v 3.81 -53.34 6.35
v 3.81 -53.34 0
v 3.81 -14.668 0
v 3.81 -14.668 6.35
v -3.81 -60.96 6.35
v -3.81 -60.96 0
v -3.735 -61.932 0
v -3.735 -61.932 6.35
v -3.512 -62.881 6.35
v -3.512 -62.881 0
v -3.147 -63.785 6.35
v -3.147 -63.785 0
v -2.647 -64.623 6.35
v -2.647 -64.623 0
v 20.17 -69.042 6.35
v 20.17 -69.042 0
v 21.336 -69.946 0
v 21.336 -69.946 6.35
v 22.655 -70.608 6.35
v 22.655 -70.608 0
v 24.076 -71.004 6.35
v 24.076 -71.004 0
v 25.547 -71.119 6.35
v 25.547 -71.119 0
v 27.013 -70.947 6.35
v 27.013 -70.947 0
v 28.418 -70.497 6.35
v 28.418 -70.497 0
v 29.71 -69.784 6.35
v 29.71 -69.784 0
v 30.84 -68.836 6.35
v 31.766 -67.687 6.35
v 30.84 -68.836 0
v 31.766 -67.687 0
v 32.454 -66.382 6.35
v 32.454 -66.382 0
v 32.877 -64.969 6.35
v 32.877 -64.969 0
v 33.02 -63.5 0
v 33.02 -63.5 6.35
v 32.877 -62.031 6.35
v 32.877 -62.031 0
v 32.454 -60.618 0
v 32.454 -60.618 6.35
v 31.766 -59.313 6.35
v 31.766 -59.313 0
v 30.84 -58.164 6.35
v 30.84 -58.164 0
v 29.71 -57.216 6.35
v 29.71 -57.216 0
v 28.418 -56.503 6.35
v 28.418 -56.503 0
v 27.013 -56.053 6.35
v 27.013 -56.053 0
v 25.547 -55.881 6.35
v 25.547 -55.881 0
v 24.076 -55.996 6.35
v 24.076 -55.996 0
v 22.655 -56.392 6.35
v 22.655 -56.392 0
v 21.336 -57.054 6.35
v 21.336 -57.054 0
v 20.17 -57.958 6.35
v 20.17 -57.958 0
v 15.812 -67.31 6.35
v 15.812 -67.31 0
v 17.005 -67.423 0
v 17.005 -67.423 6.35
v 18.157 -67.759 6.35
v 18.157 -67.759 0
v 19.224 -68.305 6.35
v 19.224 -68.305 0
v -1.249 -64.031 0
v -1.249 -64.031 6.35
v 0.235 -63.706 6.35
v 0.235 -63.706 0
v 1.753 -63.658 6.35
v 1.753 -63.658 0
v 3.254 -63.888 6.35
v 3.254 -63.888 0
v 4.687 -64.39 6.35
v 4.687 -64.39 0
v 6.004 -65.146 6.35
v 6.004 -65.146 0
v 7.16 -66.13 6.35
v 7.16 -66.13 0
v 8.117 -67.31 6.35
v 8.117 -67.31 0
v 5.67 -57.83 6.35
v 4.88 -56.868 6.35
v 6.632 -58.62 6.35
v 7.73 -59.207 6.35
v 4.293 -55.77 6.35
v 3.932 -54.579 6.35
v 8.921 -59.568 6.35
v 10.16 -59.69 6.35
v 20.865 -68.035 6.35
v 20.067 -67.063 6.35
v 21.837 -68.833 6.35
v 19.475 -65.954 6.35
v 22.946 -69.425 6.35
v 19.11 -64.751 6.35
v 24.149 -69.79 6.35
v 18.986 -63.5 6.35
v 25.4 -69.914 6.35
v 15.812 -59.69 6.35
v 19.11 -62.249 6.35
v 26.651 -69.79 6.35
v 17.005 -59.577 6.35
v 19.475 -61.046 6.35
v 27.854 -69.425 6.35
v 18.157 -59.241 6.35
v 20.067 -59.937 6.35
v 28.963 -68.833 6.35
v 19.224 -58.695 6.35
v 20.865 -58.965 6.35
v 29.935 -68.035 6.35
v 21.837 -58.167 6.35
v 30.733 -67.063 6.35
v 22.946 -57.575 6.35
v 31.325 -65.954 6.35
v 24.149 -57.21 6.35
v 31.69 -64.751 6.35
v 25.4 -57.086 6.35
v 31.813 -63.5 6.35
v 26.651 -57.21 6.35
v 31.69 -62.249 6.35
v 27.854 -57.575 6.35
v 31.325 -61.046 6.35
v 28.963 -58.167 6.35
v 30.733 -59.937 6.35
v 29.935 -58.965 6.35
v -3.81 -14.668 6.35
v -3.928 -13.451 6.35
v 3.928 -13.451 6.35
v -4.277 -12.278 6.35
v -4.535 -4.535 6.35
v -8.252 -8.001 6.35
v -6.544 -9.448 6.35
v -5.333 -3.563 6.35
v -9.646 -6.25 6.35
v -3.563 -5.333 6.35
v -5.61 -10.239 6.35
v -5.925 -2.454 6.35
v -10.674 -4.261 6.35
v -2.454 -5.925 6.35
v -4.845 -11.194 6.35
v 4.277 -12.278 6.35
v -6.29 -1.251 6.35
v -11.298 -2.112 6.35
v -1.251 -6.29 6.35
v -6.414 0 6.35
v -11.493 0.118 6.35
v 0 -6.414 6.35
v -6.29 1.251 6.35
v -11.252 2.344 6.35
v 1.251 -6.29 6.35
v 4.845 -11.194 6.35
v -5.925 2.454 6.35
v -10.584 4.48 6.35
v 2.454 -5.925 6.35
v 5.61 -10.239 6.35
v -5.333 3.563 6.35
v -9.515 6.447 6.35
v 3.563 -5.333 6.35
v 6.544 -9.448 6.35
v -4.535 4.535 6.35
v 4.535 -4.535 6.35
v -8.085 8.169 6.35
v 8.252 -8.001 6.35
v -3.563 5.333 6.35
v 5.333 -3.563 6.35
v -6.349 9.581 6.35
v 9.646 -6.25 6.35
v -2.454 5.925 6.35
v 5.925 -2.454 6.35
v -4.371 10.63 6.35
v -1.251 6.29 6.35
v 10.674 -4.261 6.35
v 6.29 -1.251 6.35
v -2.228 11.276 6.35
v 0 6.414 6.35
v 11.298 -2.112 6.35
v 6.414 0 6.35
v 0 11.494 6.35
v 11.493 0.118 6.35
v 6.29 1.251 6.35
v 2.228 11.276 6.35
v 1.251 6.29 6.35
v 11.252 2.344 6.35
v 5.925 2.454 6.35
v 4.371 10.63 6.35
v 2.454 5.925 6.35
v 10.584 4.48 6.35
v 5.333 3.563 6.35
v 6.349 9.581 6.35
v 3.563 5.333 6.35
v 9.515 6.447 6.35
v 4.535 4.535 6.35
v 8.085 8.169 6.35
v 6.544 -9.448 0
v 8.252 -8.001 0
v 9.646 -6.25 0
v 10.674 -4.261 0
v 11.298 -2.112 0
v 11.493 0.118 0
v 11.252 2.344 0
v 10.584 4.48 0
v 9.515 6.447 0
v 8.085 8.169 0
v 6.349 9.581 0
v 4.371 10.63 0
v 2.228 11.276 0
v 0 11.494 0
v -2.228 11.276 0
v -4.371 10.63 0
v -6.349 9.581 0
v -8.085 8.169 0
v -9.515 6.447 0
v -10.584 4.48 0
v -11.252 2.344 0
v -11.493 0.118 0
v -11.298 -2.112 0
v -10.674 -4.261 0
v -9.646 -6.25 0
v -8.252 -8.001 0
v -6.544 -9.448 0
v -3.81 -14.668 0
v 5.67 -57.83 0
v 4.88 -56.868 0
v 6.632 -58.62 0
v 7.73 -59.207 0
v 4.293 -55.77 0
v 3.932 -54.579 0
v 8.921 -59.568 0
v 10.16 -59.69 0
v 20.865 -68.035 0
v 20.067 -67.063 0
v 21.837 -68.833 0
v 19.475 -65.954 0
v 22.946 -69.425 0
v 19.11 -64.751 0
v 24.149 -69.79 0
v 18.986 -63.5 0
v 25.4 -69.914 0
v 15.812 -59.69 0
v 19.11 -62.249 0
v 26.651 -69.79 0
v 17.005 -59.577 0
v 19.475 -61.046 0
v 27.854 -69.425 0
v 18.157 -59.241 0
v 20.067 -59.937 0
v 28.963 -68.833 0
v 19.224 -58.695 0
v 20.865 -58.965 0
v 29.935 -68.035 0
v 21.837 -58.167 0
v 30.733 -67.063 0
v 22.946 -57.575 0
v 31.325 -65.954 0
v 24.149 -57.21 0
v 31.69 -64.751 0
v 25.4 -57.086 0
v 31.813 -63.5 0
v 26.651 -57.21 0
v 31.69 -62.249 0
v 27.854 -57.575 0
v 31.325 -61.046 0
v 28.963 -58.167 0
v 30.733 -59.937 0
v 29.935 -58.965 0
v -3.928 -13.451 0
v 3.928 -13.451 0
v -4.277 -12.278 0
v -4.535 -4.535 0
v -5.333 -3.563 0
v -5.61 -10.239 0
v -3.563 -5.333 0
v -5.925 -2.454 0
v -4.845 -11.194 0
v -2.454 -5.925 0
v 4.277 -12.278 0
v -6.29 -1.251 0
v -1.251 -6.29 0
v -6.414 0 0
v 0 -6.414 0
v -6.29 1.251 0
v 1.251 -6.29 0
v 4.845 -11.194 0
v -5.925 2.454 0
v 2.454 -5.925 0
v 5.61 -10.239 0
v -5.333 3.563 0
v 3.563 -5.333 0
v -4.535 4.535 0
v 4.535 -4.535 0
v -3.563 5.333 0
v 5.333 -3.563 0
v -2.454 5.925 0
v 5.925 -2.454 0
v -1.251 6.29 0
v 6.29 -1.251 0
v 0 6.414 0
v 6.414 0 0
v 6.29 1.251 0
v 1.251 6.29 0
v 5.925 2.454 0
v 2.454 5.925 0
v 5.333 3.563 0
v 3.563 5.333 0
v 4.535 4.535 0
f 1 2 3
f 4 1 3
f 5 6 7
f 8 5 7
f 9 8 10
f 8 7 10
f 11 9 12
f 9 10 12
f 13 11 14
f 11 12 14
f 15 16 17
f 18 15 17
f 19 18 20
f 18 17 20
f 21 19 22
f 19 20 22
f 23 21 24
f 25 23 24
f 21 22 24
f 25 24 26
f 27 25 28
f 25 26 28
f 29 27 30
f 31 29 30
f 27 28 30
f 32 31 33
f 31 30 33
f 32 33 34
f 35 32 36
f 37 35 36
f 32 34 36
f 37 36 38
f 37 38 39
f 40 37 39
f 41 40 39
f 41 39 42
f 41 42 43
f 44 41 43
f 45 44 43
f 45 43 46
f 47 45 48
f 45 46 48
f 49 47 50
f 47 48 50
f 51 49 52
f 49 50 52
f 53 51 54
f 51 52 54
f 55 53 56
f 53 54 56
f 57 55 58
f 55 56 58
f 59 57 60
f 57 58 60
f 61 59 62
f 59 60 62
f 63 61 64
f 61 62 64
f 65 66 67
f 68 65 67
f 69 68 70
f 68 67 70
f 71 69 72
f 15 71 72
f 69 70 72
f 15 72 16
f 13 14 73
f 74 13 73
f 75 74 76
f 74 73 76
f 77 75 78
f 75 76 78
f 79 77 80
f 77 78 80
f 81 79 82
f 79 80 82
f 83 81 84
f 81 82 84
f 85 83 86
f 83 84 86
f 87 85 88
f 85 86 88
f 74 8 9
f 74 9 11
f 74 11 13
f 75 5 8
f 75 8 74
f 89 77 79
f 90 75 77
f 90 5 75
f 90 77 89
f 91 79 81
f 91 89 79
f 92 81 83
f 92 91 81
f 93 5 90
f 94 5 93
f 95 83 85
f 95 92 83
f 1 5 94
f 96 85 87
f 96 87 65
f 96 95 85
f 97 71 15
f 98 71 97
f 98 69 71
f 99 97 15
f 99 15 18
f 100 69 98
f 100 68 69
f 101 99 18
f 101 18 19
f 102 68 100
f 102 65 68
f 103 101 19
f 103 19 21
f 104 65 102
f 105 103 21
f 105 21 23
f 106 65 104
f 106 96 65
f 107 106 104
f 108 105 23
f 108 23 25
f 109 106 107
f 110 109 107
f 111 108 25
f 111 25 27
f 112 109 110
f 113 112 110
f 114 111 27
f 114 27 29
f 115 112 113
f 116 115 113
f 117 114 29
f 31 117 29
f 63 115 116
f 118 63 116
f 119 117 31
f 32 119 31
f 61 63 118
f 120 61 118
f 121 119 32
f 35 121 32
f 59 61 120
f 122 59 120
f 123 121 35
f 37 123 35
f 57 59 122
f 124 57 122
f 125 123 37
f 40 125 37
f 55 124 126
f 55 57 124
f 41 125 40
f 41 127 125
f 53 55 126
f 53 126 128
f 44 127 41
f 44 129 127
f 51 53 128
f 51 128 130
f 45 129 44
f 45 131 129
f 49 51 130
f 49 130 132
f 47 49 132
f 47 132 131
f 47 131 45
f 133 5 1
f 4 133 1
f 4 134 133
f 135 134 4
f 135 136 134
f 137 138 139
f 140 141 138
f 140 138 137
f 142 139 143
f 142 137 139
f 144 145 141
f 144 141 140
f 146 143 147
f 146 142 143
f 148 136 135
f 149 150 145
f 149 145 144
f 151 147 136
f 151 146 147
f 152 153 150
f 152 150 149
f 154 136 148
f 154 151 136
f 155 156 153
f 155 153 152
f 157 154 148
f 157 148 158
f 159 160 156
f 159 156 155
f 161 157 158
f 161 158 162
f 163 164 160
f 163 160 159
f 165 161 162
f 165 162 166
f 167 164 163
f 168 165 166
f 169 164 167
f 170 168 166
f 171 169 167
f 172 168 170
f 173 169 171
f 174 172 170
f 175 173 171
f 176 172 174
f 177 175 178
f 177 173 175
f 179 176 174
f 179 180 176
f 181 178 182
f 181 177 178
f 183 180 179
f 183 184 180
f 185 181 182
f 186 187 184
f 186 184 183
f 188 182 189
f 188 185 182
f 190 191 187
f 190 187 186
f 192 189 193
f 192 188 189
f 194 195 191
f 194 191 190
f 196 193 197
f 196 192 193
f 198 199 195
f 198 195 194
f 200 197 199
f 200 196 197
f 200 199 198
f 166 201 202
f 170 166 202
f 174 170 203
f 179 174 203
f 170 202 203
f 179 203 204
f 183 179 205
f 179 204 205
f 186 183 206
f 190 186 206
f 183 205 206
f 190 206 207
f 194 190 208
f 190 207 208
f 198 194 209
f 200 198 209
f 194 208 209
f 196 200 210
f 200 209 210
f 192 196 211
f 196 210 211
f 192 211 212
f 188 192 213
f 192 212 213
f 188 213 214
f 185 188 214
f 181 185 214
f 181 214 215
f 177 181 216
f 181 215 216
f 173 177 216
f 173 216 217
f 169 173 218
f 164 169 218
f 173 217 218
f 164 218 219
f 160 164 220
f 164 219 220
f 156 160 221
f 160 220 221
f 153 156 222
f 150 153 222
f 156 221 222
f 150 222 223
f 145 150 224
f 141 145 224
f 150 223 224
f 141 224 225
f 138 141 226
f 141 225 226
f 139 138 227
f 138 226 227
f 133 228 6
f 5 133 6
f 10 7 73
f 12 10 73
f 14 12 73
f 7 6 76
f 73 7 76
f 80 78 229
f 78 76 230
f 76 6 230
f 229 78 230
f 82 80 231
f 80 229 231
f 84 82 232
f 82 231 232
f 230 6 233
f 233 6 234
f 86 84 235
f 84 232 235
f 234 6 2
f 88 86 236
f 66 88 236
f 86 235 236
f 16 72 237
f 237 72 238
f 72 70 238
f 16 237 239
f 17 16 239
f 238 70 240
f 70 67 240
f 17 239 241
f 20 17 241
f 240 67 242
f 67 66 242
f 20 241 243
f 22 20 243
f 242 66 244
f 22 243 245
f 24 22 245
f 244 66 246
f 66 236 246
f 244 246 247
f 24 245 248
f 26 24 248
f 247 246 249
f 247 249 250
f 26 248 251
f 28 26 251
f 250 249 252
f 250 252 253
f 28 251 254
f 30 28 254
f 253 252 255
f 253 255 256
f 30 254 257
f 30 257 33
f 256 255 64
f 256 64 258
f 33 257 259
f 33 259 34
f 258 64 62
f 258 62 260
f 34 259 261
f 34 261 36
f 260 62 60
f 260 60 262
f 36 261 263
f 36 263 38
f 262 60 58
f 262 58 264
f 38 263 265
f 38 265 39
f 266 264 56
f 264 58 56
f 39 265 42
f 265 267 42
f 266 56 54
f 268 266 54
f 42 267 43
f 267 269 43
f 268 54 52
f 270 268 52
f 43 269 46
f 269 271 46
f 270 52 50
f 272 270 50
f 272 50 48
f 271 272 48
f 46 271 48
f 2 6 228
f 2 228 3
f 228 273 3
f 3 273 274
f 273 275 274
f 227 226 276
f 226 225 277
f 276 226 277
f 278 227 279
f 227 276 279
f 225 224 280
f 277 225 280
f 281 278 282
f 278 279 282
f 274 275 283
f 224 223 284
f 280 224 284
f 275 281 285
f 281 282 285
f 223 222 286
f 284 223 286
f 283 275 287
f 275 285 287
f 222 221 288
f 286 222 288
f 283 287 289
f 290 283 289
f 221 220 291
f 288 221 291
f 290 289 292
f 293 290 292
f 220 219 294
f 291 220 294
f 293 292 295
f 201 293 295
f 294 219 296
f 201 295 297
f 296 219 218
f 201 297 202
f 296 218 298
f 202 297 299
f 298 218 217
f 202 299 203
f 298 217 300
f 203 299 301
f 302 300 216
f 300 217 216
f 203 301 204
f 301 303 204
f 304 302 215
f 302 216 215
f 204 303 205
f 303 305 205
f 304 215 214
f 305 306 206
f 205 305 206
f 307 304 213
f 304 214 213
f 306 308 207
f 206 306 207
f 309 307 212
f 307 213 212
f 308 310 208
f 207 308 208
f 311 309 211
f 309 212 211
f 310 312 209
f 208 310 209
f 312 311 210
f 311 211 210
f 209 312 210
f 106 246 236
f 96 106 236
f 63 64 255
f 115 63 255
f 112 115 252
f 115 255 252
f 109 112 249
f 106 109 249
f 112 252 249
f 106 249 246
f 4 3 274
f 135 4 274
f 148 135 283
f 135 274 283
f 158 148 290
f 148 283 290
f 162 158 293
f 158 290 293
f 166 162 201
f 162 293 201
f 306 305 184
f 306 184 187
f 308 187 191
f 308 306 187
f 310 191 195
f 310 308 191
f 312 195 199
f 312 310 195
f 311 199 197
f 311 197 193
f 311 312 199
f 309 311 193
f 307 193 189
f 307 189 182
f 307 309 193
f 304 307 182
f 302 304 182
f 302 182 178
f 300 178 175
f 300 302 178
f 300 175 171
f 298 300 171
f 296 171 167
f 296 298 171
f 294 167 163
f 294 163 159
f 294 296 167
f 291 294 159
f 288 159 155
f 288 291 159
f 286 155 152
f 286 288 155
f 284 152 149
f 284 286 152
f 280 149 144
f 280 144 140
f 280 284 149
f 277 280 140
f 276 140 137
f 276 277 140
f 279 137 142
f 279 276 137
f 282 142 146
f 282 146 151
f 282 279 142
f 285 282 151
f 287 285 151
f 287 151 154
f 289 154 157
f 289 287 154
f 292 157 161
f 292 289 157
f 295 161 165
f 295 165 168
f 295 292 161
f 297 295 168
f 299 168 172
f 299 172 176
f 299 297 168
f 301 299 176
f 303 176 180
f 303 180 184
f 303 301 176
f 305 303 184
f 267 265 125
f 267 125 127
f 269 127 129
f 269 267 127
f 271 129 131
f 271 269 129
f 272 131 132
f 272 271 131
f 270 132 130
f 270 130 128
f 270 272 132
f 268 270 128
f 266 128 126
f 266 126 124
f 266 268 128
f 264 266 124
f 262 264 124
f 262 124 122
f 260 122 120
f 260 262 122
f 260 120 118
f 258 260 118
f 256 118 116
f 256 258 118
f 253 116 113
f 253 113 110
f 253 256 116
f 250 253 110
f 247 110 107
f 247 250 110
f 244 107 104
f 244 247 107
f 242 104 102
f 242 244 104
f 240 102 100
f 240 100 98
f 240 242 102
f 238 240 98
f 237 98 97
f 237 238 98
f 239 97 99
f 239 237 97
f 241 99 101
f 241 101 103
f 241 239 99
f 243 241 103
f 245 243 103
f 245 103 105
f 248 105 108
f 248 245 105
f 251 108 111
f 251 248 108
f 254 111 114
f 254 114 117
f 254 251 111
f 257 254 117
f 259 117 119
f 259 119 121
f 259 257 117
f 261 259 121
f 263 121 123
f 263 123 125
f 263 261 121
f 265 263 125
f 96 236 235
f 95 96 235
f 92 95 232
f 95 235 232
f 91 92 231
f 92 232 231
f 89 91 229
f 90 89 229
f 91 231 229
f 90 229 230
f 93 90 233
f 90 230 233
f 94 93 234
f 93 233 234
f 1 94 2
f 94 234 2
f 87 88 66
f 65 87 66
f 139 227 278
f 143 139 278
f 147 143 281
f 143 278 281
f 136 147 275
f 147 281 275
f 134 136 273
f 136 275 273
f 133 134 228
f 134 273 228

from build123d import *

# Parameters (mm, degrees)
ESQUISSE1_R             = 6.4135
BOSS_EXTRU_1_DEPTH      = 6.35
ESQUISSE5_R             = 8.255
ENL_V_MAT_EXTRU_3_DEPTH = 7.35


with BuildPart() as part:
    # Esquisse1 → Boss.-Extru.1 (new body)
    with BuildSketch(Plane.XY):
        with BuildLine():
            Line((-3.81, -14.6685), (-3.81, -60.96))
            ThreePointArc((-3.81, -60.96), (-1.950128061, -65.450128061), (2.54, -67.31))
            Line((2.54, -67.31), (15.811710267, -67.31))
            ThreePointArc((15.811710267, -67.31), (18.15660317, -67.758815604), (20.170023782, -69.041818182))
            ThreePointArc((20.170023782, -69.041818182), (33.02, -63.5), (20.170023782, -57.958181818))
            ThreePointArc((20.170023782, -57.958181818), (18.15660317, -59.241184396), (15.811710267, -59.69))
            Line((15.811710267, -59.69), (10.16, -59.69))
            ThreePointArc((10.16, -59.69), (5.669871939, -57.830128061), (3.81, -53.34))
            Line((3.81, -53.34), (3.81, -14.6685))
            ThreePointArc((3.81, -14.6685), (4.534969751, -11.722055584), (6.544341637, -9.448393238))
            ThreePointArc((6.544341637, -9.448393238), (0, 11.4935), (-6.544341637, -9.448393238))
            ThreePointArc((-6.544341637, -9.448393238), (-4.534969751, -11.722055584), (-3.81, -14.6685))
        make_face()
        Circle(ESQUISSE1_R, mode=Mode.SUBTRACT)
        with Locations((25.4, -63.5)):
            Circle(ESQUISSE1_R, mode=Mode.SUBTRACT)
    extrude(amount=BOSS_EXTRU_1_DEPTH)

    # Esquisse5 → Enlèv. mat.-Extru.3 (cut, through all)
    with BuildSketch(Plane(origin=(0, 0, 0), x_dir=(-1, 0, 0), z_dir=(0, 0, -1))):
        with Locations((-1.254065113, -71.897575416)):
            Circle(ESQUISSE5_R)
    extrude(amount=-ENL_V_MAT_EXTRU_3_DEPTH, mode=Mode.SUBTRACT)


solid = part.part
